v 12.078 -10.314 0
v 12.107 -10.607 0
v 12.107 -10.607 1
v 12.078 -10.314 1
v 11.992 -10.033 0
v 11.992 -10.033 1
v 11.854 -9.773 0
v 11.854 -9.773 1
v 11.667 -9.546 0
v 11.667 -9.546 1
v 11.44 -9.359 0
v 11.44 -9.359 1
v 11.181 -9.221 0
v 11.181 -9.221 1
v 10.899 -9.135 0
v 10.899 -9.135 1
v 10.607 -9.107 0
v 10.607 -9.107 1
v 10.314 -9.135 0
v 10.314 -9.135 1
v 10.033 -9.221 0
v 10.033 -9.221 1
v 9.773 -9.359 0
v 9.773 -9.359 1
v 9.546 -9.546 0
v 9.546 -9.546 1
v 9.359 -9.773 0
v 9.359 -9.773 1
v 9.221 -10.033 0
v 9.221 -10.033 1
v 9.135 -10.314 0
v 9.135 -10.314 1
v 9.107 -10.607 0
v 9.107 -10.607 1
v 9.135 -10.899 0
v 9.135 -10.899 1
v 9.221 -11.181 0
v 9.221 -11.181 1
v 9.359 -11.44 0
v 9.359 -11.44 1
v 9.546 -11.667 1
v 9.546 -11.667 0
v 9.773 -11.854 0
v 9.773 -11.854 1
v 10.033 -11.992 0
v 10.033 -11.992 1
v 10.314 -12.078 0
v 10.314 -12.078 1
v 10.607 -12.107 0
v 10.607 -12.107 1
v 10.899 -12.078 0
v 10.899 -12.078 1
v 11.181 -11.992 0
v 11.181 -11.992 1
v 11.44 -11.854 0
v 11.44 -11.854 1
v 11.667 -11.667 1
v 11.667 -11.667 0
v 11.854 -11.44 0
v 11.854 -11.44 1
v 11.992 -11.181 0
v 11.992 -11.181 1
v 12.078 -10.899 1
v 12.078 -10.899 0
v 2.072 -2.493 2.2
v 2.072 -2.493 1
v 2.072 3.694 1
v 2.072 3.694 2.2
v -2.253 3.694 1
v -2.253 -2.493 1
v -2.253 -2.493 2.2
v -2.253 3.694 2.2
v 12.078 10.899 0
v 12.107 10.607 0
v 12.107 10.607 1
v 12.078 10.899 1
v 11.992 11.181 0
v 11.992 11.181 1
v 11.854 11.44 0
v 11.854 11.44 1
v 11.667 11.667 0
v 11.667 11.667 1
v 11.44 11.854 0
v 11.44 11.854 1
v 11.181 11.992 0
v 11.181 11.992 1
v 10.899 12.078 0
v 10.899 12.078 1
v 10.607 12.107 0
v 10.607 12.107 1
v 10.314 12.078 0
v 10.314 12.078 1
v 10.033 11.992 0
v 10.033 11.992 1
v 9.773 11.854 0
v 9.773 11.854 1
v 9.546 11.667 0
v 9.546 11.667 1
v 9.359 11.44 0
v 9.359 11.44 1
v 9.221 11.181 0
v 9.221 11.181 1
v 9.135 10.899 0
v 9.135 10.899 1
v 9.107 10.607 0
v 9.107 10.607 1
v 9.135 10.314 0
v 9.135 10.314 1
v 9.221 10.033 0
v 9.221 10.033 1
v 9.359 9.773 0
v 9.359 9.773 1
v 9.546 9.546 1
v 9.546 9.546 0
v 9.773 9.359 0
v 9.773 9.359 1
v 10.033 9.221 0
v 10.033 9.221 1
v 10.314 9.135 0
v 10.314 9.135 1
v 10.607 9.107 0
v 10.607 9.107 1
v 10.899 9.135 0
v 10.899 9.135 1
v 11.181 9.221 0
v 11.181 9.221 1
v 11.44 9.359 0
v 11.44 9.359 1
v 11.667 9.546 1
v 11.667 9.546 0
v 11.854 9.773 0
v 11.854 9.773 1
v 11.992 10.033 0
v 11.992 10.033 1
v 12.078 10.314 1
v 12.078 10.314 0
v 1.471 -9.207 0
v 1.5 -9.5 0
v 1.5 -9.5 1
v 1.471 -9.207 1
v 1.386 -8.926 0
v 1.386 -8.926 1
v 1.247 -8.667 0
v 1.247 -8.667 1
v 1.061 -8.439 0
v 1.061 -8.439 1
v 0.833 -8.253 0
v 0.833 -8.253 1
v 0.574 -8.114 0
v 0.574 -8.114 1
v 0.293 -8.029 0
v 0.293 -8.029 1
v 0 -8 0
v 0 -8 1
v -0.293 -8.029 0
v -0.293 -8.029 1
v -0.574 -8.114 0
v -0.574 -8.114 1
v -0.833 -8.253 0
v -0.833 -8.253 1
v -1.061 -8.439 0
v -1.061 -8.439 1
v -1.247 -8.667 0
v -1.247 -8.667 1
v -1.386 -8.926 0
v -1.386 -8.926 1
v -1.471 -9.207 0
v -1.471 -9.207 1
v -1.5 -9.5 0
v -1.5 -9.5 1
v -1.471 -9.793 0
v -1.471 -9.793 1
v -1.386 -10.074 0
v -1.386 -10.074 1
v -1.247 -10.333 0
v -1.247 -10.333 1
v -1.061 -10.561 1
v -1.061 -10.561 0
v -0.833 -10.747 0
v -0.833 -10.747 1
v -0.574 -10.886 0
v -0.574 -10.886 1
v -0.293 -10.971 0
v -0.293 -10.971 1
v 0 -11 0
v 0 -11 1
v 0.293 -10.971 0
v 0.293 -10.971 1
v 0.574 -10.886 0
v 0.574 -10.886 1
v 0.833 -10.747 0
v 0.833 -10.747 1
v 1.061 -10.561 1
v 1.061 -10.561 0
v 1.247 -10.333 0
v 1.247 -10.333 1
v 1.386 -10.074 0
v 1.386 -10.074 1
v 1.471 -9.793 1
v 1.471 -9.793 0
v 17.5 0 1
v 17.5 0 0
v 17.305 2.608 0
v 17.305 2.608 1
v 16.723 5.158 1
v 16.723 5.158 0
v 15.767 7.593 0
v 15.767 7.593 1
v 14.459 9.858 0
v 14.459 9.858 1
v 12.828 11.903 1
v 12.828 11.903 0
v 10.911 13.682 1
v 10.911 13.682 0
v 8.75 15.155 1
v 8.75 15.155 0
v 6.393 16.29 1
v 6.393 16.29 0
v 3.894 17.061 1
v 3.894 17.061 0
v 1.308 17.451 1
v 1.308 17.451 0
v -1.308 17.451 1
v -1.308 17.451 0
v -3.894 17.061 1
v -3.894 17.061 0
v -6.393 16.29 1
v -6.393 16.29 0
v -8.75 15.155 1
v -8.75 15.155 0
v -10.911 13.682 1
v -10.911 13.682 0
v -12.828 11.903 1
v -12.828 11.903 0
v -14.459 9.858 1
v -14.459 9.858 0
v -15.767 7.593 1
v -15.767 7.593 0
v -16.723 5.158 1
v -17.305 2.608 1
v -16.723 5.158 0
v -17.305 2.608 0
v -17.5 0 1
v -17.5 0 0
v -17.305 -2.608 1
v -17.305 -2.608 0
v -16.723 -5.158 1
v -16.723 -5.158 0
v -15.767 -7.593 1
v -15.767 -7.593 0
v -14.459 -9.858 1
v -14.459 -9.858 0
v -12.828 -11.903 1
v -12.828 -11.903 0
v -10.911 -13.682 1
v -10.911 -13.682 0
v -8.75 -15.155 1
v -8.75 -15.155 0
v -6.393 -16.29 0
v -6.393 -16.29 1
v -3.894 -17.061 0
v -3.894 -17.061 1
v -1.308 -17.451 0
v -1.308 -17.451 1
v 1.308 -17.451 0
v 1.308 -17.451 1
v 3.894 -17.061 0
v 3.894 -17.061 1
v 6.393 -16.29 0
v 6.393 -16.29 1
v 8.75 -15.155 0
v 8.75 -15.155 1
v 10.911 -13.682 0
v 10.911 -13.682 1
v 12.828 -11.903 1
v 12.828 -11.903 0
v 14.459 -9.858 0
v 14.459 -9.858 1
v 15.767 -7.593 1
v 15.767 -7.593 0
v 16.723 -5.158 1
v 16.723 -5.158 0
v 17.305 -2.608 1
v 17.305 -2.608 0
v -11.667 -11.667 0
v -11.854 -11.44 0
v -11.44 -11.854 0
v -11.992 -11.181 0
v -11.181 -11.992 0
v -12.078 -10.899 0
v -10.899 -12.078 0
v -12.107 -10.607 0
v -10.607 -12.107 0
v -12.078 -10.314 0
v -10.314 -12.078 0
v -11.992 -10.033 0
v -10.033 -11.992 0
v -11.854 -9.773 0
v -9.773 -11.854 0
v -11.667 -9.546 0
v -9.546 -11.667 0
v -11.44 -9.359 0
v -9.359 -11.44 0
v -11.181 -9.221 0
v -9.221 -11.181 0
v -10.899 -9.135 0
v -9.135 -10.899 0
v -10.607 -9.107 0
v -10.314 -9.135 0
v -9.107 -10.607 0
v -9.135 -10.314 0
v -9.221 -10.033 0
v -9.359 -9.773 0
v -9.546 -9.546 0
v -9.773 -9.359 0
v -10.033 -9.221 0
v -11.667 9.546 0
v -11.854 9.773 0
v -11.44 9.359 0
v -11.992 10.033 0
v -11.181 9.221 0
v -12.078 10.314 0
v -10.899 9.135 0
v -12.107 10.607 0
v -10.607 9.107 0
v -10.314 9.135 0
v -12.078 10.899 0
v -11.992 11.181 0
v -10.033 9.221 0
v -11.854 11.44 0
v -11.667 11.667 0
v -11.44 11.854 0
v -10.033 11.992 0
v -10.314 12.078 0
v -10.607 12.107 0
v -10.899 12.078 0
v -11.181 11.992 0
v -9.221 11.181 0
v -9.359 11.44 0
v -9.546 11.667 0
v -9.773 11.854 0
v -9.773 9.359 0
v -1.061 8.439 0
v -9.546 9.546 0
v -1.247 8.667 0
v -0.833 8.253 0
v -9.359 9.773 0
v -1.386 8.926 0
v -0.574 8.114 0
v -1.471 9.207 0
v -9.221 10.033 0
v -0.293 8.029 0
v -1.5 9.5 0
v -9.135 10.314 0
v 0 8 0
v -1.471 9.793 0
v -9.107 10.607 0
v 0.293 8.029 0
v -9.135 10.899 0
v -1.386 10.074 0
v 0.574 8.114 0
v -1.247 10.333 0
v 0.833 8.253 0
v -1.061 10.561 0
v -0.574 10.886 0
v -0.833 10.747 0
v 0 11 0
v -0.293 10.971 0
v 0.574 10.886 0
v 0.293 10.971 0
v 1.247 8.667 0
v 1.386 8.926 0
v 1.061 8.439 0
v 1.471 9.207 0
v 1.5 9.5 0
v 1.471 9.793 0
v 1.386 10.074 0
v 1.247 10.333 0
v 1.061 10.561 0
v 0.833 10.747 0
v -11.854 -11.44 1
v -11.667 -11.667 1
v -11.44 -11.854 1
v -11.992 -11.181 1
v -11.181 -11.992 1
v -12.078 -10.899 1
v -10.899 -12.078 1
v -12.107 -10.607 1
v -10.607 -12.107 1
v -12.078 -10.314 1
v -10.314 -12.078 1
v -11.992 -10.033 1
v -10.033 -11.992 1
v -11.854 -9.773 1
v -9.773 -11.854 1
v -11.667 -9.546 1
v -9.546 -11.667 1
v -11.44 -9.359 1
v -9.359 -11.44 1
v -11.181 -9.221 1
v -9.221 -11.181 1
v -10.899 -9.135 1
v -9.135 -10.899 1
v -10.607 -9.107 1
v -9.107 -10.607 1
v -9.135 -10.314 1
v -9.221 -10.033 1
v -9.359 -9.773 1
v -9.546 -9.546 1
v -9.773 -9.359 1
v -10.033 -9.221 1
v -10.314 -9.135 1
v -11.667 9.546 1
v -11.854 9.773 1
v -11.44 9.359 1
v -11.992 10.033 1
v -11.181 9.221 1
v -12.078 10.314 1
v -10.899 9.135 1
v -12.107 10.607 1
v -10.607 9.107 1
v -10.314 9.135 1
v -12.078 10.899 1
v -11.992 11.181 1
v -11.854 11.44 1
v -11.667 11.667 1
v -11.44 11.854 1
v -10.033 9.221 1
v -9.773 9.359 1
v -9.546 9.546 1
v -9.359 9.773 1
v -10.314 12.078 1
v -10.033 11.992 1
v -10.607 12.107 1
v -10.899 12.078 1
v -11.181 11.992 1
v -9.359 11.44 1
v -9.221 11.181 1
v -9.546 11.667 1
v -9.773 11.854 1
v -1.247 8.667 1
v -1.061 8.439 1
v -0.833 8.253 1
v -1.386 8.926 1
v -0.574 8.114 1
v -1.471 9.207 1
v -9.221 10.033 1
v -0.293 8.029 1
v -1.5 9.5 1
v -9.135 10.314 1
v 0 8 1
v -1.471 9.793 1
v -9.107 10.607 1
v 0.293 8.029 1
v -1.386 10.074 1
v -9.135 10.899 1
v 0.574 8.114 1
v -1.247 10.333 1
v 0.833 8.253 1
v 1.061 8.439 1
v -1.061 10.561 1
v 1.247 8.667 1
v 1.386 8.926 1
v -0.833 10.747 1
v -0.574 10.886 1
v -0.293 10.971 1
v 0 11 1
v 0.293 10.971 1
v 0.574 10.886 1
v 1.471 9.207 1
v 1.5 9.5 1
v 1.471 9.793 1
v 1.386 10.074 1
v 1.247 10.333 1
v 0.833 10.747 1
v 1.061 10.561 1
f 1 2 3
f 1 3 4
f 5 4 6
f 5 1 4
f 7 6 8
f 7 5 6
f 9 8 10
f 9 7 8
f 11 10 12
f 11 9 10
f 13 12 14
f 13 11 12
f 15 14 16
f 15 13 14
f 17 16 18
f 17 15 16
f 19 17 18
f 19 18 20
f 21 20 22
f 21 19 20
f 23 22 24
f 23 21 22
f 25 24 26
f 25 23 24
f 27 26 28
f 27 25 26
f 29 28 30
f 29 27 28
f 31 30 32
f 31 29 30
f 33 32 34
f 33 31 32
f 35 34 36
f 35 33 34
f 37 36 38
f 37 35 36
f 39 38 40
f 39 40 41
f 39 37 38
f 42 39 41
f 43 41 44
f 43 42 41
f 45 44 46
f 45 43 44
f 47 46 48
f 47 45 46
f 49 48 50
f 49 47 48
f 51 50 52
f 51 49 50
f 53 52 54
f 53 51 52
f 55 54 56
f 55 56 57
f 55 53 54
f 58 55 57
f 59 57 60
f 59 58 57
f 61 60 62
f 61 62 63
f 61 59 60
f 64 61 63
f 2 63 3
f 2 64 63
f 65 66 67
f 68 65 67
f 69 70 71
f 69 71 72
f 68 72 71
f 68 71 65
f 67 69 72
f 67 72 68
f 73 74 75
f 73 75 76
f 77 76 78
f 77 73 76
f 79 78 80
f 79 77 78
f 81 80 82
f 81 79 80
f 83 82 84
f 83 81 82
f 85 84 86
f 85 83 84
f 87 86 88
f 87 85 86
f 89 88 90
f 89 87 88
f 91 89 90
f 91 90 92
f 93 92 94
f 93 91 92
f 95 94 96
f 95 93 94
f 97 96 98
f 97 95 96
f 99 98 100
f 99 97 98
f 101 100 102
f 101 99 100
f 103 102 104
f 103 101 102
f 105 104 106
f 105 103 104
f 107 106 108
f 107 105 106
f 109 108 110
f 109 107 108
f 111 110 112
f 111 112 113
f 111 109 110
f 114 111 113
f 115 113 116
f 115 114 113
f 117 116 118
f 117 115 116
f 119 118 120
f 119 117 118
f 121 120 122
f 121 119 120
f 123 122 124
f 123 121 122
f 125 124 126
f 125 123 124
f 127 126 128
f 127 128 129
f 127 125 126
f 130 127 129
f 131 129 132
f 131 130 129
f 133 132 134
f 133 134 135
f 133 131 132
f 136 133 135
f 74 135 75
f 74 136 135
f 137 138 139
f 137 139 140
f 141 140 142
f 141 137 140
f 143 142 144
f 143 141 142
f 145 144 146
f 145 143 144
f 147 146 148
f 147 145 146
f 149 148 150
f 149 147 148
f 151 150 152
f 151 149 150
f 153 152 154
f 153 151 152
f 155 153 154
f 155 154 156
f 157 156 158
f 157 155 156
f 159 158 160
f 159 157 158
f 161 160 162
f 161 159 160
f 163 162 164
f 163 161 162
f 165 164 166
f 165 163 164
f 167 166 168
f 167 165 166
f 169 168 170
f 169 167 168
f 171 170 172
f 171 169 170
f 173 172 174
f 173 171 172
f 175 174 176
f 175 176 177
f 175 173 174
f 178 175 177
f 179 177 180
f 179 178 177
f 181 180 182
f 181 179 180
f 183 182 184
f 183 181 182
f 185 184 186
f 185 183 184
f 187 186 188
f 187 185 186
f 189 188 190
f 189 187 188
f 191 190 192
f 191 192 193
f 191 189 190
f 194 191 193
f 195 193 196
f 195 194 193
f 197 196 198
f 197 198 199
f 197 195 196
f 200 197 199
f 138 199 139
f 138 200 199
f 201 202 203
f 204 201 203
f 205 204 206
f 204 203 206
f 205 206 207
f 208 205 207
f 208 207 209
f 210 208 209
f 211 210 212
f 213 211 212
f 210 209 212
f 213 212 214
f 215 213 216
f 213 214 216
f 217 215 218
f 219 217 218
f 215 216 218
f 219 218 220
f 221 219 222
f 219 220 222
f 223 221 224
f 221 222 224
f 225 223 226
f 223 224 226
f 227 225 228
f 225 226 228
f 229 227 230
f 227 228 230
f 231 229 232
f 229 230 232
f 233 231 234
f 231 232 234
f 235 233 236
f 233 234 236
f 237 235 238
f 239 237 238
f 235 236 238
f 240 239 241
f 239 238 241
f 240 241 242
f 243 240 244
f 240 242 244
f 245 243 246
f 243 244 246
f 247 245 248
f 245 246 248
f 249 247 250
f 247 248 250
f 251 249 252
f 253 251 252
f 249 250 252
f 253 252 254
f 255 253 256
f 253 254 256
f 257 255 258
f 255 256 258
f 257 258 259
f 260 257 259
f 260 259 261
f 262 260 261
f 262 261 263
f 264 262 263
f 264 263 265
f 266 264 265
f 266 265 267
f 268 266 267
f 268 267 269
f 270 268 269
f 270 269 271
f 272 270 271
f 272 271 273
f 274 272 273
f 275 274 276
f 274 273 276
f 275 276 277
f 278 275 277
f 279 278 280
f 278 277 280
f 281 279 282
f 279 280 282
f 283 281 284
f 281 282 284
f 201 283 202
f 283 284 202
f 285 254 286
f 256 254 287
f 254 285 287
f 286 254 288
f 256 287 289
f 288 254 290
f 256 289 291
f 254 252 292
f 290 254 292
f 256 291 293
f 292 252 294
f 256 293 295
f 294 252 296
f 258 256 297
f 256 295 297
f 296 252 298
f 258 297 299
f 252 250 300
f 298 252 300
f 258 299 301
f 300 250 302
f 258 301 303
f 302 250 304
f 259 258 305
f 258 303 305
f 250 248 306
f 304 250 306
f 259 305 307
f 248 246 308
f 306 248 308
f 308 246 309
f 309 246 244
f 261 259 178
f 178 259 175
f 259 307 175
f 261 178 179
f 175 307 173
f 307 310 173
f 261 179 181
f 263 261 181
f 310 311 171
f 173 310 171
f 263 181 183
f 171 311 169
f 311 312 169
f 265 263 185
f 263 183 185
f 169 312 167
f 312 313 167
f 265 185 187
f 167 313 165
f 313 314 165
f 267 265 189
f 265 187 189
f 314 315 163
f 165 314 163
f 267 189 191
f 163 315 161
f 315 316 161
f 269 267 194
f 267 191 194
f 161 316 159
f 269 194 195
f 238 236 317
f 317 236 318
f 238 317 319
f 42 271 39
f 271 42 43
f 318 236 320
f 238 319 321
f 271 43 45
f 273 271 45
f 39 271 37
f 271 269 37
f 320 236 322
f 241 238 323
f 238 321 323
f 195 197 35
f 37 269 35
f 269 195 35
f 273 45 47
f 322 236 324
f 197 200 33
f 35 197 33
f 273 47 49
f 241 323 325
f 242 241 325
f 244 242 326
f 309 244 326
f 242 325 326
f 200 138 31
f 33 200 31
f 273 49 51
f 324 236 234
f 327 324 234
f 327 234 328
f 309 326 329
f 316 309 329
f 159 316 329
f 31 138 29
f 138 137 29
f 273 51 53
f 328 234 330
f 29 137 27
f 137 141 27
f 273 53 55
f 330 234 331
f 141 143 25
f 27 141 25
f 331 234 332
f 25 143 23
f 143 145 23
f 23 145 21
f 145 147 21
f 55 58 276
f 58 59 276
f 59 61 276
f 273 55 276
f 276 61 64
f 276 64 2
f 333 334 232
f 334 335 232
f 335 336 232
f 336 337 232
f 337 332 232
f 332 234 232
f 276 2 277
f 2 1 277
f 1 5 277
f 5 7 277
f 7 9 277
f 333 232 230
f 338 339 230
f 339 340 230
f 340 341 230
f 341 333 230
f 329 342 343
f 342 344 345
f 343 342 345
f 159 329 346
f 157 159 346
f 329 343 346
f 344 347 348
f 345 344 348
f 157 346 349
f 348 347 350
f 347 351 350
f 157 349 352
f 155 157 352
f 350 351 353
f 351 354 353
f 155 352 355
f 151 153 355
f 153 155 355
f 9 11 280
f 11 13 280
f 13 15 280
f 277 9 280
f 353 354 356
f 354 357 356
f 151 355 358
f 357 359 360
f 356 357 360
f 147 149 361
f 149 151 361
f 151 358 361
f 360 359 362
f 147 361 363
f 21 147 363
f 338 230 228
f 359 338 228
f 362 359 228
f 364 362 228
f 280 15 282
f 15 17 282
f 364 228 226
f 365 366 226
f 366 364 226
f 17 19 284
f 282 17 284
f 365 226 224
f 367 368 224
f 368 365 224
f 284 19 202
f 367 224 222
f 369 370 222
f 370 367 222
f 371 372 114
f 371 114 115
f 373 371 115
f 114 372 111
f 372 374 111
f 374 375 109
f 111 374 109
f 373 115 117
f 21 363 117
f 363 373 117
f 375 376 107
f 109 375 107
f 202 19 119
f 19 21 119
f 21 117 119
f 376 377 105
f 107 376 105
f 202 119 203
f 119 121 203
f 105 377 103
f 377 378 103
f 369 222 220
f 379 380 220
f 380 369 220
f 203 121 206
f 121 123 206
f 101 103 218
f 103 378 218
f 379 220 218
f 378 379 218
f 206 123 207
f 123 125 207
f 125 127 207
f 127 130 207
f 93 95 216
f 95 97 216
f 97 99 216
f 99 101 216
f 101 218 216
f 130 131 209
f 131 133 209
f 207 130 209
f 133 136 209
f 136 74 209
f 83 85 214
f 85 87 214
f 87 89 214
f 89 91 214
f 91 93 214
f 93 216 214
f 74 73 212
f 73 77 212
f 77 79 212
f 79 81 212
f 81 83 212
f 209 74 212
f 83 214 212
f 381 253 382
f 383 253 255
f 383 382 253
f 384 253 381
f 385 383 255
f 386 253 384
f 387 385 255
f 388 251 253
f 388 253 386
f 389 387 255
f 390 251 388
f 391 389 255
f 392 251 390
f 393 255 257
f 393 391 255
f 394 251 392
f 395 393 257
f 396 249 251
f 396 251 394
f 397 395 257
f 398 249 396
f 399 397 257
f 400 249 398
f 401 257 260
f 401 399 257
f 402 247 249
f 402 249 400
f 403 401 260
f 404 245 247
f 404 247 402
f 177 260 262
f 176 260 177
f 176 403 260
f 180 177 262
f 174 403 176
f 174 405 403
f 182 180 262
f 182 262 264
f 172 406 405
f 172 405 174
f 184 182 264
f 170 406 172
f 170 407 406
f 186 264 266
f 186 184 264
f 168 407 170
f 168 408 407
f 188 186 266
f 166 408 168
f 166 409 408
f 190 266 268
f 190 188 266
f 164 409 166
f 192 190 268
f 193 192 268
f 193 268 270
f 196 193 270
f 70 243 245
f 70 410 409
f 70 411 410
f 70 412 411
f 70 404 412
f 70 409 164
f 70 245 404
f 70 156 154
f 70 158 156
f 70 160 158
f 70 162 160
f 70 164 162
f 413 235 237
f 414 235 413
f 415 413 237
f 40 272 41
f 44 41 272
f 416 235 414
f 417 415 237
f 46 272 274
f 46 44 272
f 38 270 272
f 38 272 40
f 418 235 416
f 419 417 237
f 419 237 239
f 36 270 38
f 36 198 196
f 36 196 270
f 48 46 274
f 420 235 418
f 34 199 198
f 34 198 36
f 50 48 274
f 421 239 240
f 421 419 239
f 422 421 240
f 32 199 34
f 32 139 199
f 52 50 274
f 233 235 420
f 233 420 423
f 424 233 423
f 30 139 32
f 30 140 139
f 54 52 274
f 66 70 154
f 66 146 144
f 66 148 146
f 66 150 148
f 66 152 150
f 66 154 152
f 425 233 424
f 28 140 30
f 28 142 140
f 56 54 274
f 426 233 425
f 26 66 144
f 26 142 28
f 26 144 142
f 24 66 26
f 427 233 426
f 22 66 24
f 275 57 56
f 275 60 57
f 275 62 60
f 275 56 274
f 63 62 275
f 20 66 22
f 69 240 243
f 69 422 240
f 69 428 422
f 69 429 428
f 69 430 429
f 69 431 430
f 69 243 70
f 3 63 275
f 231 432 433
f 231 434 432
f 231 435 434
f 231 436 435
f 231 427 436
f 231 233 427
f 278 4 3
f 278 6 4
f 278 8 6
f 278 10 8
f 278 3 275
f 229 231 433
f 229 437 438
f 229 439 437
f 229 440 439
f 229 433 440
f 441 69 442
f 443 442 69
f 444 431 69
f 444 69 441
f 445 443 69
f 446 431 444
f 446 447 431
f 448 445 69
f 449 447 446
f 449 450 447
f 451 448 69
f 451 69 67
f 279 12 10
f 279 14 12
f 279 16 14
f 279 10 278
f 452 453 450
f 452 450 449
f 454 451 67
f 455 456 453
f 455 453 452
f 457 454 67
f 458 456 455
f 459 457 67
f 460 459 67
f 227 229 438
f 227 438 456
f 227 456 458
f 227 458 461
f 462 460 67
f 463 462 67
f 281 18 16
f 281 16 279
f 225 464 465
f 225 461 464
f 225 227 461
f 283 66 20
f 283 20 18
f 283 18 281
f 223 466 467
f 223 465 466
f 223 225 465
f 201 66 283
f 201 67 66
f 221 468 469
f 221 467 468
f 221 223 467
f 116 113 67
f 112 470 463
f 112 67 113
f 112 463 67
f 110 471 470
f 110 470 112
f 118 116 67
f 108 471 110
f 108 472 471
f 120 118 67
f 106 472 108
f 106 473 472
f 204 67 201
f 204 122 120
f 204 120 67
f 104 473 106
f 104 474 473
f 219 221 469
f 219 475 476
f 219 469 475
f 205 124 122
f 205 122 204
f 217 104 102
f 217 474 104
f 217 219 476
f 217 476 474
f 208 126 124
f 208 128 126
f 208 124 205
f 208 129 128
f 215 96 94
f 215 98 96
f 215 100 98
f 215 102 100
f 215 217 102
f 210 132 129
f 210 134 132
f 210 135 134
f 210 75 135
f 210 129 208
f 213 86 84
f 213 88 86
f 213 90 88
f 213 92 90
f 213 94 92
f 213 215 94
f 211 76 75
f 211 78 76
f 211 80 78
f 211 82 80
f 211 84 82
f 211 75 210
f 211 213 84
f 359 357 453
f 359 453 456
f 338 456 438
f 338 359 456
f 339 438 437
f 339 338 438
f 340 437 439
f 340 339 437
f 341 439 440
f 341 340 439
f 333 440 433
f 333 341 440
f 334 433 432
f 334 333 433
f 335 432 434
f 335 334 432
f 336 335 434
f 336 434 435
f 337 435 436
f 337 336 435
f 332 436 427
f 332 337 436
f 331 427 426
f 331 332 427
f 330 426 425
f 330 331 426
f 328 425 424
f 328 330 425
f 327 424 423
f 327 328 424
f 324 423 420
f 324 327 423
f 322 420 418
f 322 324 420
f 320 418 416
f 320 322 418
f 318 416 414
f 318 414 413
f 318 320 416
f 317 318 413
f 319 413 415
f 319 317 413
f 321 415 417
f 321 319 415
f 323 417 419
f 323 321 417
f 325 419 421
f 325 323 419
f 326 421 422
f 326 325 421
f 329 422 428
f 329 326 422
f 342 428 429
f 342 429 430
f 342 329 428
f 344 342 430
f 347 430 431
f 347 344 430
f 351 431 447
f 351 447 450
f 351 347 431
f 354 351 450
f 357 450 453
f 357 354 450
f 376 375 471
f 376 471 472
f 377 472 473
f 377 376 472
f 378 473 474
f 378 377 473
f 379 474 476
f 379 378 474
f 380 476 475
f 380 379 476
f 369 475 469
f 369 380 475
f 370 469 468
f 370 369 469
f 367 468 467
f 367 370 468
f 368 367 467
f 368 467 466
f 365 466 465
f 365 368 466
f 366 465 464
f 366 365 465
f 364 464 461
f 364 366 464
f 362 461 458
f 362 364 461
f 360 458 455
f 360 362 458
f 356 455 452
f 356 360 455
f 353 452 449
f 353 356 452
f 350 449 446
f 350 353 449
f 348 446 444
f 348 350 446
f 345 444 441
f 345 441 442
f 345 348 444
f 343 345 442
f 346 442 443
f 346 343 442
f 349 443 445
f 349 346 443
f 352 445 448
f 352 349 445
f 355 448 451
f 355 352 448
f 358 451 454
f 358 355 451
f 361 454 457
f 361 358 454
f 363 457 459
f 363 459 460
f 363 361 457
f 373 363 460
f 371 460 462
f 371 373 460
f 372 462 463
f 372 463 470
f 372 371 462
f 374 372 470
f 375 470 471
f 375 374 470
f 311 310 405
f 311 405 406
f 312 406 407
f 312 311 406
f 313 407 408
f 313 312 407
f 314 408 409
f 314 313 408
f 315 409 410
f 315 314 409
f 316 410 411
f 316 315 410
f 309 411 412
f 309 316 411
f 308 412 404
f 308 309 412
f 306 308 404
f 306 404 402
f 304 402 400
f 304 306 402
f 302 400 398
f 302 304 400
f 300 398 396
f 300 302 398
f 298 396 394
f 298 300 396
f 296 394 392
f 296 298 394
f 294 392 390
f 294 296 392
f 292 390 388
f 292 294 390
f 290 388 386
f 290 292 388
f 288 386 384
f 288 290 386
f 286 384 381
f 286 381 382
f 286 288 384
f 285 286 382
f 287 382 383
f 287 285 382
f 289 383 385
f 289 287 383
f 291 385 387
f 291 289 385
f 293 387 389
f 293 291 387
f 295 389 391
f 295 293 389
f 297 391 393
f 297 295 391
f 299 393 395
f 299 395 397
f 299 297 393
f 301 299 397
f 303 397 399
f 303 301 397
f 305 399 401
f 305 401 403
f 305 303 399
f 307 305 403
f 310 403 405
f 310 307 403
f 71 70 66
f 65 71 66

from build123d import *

# Parameters (mm, degrees)
SKETCH_1_R      = 17.5
SKETCH_1_R_2    = 1.5
EXTRUDE_1_DEPTH = 1
SKETCH_2_W      = 4.325123413
SKETCH_2_H      = 6.187329326
EXTRUDE_2_DEPTH = 1.2


with BuildPart() as part:
    # 草图1 → 凸台-拉伸1 (new body)
    with BuildSketch(Plane.XY):
        Circle(SKETCH_1_R)
        with Locations((0, 9.5)):
            Circle(SKETCH_1_R_2, mode=Mode.SUBTRACT)
        with Locations((0, -9.5)):
            Circle(SKETCH_1_R_2, mode=Mode.SUBTRACT)
        with Locations((10.606601718, 10.606601718)):
            Circle(SKETCH_1_R_2, mode=Mode.SUBTRACT)
        with Locations((10.606601718, -10.606601718)):
            Circle(SKETCH_1_R_2, mode=Mode.SUBTRACT)
        with Locations((-10.606601718, -10.606601718)):
            Circle(SKETCH_1_R_2, mode=Mode.SUBTRACT)
        with Locations((-10.606601718, 10.606601718)):
            Circle(SKETCH_1_R_2, mode=Mode.SUBTRACT)
    extrude(amount=EXTRUDE_1_DEPTH)

    # 草图2 → 凸台-拉伸2 (add)
    with BuildSketch(Plane.XY.offset(1)):
        with Locations((-0.090106737, 0.600711585)):
            Rectangle(SKETCH_2_W, SKETCH_2_H)
    extrude(amount=EXTRUDE_2_DEPTH)


solid = part.part
